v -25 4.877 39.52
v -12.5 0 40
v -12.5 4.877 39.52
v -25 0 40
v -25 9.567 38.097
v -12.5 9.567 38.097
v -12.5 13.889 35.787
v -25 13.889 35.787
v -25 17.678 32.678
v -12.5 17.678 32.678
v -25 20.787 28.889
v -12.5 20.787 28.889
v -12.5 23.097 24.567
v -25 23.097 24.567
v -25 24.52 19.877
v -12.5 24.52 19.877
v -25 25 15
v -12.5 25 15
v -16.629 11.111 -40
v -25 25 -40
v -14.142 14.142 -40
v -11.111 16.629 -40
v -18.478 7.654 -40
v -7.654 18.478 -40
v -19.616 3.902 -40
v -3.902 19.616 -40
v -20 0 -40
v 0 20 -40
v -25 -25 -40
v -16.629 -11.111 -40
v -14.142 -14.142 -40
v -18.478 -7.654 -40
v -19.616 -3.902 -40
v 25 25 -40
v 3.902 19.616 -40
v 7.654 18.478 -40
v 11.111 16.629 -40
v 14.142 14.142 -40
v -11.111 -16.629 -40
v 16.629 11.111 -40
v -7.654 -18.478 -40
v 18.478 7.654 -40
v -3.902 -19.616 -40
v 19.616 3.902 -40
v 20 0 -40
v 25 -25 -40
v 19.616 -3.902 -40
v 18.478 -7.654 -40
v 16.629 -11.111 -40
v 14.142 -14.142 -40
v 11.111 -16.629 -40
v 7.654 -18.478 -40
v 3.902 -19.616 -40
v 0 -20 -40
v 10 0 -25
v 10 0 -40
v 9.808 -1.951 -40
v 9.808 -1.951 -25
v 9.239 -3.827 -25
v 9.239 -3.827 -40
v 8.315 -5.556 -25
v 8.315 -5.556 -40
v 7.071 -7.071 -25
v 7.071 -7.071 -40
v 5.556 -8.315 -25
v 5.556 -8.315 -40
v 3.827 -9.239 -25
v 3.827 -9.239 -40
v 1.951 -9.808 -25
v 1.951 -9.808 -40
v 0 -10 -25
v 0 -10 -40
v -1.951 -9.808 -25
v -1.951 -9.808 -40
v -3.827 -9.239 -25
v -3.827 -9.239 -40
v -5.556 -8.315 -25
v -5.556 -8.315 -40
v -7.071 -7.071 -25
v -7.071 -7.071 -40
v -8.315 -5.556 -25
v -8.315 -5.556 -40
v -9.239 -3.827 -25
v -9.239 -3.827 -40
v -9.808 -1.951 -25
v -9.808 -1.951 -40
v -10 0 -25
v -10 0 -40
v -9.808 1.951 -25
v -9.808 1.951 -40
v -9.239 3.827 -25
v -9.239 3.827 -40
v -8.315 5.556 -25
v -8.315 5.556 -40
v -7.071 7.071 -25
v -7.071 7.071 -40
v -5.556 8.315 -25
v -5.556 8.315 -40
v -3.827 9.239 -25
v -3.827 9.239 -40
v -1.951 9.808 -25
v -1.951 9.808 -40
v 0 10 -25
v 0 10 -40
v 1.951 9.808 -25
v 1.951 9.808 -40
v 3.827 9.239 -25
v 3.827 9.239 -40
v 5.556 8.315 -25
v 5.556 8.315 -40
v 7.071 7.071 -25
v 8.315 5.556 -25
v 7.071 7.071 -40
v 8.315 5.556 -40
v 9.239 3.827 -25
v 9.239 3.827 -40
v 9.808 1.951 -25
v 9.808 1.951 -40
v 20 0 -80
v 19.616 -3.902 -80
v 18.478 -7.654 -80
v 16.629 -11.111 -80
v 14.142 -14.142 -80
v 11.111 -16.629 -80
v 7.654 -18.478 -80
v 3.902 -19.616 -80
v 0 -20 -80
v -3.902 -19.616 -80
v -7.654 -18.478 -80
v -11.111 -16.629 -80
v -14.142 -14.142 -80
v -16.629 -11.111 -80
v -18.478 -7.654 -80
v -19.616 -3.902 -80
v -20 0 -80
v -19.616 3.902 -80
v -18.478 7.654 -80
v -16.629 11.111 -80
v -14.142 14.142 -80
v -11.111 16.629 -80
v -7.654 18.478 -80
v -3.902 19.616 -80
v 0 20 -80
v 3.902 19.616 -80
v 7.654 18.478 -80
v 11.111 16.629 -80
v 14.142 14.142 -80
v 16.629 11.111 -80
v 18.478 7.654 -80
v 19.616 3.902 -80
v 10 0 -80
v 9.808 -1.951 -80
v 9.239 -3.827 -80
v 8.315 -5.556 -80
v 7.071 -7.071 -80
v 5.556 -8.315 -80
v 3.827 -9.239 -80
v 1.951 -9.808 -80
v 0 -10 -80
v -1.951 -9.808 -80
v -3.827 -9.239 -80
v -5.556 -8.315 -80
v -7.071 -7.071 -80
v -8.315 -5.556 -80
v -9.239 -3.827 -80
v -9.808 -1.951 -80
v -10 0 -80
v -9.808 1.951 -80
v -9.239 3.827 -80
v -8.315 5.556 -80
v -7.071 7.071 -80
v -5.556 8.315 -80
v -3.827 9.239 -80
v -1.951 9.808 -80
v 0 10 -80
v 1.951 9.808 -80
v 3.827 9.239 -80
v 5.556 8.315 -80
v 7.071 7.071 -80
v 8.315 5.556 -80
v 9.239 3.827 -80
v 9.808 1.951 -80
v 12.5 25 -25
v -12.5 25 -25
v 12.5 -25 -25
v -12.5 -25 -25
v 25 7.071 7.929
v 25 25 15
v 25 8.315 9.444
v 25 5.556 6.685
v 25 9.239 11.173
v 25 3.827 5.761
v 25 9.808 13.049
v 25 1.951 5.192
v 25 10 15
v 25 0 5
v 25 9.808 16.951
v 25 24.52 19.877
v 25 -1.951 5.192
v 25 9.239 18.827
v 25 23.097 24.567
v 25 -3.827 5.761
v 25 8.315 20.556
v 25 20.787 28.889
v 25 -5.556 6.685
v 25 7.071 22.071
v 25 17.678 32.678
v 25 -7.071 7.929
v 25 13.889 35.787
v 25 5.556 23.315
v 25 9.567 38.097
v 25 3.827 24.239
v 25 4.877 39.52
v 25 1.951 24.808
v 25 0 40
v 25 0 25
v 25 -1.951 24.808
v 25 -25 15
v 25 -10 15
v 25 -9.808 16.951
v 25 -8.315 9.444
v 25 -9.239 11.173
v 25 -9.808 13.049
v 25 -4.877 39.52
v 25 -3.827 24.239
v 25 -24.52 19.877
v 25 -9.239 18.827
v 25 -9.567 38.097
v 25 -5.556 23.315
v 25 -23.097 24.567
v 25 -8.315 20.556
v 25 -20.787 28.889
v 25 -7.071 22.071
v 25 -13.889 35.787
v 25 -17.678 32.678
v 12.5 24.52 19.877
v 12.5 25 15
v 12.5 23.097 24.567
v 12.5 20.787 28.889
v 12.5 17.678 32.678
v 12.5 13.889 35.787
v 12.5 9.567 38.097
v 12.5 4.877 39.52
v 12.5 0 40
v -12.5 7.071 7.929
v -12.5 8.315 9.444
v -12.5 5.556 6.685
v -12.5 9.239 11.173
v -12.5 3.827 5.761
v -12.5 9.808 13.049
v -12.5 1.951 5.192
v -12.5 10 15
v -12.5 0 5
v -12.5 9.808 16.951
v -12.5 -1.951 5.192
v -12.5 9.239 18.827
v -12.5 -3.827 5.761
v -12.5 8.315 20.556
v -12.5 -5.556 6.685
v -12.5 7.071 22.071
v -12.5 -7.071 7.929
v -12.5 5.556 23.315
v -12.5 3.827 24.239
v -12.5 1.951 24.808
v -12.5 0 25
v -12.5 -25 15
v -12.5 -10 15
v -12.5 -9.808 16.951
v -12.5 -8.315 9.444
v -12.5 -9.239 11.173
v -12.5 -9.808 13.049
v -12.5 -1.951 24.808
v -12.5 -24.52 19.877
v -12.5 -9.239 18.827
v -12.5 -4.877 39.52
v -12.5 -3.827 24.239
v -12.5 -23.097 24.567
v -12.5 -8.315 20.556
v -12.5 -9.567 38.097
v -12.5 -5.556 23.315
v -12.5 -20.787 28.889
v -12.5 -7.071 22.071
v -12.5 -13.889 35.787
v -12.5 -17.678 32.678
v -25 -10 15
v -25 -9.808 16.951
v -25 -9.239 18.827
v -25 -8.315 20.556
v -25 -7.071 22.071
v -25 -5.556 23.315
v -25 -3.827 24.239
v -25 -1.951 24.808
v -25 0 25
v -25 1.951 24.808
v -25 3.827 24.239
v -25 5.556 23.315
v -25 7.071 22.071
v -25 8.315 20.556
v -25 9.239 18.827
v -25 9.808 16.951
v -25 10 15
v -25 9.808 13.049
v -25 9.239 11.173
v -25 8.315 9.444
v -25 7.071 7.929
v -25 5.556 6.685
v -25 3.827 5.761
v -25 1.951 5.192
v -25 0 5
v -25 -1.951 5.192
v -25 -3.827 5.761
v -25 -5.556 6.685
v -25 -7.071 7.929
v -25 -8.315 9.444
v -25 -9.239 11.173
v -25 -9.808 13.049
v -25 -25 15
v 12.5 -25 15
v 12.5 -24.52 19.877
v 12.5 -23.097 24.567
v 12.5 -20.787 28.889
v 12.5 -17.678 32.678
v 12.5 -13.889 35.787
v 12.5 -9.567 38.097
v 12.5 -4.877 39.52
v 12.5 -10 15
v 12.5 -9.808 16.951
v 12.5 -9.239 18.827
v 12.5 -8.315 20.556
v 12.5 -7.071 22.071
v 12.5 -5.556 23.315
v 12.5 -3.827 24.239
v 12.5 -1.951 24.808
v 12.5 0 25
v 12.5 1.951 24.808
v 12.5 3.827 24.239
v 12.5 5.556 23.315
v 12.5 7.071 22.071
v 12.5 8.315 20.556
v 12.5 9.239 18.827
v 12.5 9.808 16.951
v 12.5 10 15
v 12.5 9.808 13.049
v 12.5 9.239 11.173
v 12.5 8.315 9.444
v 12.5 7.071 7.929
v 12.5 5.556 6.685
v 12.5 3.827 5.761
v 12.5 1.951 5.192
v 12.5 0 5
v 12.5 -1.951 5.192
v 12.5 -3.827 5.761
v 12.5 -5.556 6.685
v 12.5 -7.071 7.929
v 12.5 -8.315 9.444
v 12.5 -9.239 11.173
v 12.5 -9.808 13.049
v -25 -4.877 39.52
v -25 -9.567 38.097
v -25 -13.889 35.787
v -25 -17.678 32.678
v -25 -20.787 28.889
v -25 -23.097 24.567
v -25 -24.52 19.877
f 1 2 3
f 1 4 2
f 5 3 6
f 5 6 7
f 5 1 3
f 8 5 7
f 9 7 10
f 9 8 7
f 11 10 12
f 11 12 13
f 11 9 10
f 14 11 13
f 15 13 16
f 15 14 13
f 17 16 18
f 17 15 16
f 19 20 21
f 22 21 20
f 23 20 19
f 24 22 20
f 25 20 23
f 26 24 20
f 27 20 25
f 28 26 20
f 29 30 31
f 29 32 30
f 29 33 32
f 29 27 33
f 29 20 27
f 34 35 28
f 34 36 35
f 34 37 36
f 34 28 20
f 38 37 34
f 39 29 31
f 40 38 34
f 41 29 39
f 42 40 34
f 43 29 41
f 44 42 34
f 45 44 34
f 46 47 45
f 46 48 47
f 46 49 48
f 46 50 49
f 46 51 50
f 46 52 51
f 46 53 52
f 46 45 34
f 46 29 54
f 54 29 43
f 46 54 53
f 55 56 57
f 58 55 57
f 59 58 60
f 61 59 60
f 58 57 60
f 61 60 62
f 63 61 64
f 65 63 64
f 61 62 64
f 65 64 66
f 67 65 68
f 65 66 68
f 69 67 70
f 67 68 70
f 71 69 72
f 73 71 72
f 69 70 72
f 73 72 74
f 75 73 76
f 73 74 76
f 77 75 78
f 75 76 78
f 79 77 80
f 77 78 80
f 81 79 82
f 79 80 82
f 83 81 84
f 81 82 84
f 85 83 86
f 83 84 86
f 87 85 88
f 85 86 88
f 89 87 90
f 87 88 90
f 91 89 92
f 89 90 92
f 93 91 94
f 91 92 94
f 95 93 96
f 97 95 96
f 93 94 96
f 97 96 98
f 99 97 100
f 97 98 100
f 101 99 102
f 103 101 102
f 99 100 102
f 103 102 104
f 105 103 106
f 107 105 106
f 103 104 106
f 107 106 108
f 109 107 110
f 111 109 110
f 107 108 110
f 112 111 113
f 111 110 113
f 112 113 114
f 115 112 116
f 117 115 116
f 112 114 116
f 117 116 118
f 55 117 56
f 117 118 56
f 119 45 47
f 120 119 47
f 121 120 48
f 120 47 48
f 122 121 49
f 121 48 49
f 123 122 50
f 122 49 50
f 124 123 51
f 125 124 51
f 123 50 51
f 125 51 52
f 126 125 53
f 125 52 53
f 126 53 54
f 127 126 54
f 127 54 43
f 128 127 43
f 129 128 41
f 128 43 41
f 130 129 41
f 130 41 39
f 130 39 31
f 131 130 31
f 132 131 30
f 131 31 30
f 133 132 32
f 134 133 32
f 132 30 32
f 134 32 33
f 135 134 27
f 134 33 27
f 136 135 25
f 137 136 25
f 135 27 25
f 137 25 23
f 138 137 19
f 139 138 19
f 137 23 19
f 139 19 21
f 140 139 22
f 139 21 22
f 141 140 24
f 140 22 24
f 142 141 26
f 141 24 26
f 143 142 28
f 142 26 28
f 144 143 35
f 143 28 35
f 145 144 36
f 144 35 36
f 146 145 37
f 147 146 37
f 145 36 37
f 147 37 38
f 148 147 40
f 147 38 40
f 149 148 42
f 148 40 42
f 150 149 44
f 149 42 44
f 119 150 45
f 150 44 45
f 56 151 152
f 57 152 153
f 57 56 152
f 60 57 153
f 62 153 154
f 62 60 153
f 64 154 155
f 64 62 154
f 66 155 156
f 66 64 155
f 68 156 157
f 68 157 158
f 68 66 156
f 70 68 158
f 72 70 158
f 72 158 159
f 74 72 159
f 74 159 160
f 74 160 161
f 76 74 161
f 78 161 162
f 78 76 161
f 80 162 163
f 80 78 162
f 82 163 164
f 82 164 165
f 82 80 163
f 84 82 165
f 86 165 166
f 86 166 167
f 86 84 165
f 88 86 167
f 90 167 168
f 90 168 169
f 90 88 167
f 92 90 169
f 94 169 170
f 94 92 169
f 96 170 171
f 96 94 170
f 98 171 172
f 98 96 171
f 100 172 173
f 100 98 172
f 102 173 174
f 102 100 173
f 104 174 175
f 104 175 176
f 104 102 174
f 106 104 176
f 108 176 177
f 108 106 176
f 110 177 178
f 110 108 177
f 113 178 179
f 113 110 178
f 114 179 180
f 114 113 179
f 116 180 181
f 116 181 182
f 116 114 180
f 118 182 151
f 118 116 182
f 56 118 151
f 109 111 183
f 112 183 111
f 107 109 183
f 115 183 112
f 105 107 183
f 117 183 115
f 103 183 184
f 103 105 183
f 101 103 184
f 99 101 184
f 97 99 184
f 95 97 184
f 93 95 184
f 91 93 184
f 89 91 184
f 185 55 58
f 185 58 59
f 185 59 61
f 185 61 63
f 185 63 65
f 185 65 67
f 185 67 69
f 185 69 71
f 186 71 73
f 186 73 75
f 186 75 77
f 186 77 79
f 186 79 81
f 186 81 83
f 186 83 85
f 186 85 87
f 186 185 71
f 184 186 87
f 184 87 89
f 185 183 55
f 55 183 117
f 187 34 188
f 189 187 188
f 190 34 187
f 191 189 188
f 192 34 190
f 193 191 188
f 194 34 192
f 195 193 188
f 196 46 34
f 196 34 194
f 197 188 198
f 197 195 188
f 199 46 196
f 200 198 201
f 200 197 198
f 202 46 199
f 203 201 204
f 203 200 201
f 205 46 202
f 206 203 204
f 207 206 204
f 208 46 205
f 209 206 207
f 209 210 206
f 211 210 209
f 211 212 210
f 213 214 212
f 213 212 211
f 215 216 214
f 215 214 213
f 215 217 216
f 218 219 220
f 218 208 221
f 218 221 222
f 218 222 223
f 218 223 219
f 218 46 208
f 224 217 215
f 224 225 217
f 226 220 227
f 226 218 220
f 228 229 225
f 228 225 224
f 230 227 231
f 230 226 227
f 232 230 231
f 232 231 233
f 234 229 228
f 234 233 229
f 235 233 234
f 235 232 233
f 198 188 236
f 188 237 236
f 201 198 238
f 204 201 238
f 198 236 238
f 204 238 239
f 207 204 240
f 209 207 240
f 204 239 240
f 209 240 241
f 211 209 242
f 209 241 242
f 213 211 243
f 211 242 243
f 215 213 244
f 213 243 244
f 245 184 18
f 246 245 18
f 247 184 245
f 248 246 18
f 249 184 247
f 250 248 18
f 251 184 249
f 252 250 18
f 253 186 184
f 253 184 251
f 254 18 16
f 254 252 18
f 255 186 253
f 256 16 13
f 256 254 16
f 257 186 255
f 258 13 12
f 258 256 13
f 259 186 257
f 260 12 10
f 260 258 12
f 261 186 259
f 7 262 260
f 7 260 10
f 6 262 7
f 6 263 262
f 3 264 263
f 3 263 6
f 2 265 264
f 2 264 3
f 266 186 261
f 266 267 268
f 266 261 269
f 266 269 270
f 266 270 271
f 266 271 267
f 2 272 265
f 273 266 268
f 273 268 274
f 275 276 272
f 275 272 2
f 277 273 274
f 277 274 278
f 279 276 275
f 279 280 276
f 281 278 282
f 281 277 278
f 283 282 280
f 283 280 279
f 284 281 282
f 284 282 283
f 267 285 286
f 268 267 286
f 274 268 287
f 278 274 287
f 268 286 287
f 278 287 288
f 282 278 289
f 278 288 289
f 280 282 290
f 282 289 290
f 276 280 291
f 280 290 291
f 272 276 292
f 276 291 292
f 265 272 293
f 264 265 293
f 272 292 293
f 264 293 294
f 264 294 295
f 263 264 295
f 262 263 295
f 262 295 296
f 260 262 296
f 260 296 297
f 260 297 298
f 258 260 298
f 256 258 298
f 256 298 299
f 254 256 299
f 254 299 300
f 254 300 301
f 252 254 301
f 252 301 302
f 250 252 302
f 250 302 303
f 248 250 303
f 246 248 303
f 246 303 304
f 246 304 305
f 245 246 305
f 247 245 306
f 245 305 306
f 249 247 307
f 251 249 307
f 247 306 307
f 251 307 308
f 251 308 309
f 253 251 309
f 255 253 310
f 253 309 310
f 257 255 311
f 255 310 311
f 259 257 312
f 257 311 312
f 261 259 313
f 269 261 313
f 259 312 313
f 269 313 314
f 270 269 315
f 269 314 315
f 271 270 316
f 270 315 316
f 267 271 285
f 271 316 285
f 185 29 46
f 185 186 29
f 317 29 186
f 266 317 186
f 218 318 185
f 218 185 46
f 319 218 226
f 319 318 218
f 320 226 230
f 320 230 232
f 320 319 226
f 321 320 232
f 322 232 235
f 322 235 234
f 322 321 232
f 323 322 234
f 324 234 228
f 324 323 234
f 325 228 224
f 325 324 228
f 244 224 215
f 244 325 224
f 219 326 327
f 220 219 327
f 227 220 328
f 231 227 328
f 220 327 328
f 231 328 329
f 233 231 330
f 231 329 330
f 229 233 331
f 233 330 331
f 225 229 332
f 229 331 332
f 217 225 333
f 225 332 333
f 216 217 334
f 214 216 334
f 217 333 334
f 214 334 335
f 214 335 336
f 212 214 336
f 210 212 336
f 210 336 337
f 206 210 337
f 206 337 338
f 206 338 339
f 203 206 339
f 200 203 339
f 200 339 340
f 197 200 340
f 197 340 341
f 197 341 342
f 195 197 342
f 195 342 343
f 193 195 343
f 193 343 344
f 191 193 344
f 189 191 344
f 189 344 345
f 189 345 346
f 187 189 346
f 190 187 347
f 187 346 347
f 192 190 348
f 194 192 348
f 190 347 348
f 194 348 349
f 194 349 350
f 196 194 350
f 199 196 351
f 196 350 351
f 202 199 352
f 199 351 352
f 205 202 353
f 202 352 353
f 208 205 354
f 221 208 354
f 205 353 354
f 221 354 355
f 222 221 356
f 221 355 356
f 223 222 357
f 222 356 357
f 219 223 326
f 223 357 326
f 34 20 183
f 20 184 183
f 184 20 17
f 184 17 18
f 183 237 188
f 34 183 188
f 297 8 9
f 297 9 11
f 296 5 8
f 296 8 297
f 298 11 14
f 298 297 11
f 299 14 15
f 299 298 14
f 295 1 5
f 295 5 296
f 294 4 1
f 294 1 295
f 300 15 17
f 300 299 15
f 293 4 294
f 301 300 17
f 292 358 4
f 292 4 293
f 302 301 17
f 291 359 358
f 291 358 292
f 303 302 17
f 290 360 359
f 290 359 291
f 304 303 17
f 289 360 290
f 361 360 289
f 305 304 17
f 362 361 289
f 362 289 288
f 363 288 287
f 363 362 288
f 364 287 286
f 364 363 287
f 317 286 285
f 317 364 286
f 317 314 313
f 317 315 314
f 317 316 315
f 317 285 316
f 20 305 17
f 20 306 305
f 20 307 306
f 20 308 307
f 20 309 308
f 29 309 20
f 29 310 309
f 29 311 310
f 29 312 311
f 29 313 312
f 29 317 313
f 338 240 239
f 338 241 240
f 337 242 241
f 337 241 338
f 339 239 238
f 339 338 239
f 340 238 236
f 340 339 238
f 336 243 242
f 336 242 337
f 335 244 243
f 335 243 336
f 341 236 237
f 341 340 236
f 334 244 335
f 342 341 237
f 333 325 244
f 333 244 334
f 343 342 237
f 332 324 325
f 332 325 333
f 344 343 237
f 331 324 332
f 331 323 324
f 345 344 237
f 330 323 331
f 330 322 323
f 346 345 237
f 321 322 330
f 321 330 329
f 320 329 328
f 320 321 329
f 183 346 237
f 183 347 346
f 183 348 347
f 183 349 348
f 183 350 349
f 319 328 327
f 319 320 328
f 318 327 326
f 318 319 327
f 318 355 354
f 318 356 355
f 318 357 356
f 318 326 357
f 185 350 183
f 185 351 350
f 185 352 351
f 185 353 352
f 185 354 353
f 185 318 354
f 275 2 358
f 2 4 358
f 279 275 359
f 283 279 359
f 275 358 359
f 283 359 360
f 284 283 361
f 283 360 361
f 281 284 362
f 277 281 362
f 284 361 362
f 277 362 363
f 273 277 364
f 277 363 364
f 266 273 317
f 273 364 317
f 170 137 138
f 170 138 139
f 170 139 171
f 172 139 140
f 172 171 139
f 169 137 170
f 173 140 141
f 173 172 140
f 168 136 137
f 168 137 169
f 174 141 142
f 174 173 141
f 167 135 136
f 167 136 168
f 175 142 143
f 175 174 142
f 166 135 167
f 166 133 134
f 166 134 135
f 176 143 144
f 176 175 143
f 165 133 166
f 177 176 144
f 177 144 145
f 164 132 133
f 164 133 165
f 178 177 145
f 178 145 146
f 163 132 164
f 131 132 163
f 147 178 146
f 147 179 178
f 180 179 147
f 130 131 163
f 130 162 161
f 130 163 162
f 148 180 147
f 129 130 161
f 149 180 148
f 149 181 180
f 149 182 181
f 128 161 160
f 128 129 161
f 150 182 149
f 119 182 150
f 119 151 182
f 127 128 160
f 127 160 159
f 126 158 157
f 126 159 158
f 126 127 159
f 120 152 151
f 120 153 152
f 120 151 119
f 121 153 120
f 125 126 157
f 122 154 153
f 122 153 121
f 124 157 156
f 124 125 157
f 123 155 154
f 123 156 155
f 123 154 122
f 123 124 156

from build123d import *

# Parameters (mm, degrees)
F1_DEPTH = 25
F2_R     = 20
F2_R_2   = 10
F3_DEPTH = 40
F4_DEPTH = 15
F5_R     = 10
F6_DEPTH = 56.6
F7_R     = 24.99999


# Not quite as in the source:
# - a fillet or chamfer is up to 0.001 mm smaller than in the source, because OpenCascade refuses the exact size


with BuildPart() as f1:
    # F0 (on Front) → F1 (new body, symmetric)
    with BuildSketch(Plane.XZ):
        Polygon((-12.5, 40), (-25, 40), (-25, -40), (25, -40), (25, 40), (12.5, 40), (12.5, -25), (-12.5, -25), align=None)
    extrude(amount=F1_DEPTH, both=True)

    # F2 (on face) → F3 (join)
    with BuildSketch(Plane(origin=(0, 0, -40), x_dir=(1, 0, 0), z_dir=(0, 0, -1))):
        Circle(F2_R)
        Circle(F2_R_2, mode=Mode.SUBTRACT)
    extrude(amount=F3_DEPTH)

    # F2 (on face) → F4 (cut)
    with BuildSketch(Plane(origin=(0, 0, -40), x_dir=(1, 0, 0), z_dir=(0, 0, -1))):
        Circle(F2_R_2)
    extrude(amount=-F4_DEPTH, mode=Mode.SUBTRACT)

    # F5 (on face) → F6 (cut)
    with BuildSketch(Plane(origin=(-25, 0, 0), x_dir=(0, -1, 0), z_dir=(-1, 0, 0))):
        with Locations((0, 15)):
            Circle(F5_R)
    extrude(amount=-F6_DEPTH, mode=Mode.SUBTRACT)

    # F7 (radius 25 in the source; OpenCascade refuses exactly that, so slightly less here)
    f7_edges = [f1.edges().sort_by_distance(p)[0] for p in [
        (18.75, 25, 40),
        (18.75, -25, 40),
        (-18.75, 25, 40),
        (-18.75, -25, 40),
    ]]
    fillet(f7_edges, radius=F7_R)


solid = f1.part
